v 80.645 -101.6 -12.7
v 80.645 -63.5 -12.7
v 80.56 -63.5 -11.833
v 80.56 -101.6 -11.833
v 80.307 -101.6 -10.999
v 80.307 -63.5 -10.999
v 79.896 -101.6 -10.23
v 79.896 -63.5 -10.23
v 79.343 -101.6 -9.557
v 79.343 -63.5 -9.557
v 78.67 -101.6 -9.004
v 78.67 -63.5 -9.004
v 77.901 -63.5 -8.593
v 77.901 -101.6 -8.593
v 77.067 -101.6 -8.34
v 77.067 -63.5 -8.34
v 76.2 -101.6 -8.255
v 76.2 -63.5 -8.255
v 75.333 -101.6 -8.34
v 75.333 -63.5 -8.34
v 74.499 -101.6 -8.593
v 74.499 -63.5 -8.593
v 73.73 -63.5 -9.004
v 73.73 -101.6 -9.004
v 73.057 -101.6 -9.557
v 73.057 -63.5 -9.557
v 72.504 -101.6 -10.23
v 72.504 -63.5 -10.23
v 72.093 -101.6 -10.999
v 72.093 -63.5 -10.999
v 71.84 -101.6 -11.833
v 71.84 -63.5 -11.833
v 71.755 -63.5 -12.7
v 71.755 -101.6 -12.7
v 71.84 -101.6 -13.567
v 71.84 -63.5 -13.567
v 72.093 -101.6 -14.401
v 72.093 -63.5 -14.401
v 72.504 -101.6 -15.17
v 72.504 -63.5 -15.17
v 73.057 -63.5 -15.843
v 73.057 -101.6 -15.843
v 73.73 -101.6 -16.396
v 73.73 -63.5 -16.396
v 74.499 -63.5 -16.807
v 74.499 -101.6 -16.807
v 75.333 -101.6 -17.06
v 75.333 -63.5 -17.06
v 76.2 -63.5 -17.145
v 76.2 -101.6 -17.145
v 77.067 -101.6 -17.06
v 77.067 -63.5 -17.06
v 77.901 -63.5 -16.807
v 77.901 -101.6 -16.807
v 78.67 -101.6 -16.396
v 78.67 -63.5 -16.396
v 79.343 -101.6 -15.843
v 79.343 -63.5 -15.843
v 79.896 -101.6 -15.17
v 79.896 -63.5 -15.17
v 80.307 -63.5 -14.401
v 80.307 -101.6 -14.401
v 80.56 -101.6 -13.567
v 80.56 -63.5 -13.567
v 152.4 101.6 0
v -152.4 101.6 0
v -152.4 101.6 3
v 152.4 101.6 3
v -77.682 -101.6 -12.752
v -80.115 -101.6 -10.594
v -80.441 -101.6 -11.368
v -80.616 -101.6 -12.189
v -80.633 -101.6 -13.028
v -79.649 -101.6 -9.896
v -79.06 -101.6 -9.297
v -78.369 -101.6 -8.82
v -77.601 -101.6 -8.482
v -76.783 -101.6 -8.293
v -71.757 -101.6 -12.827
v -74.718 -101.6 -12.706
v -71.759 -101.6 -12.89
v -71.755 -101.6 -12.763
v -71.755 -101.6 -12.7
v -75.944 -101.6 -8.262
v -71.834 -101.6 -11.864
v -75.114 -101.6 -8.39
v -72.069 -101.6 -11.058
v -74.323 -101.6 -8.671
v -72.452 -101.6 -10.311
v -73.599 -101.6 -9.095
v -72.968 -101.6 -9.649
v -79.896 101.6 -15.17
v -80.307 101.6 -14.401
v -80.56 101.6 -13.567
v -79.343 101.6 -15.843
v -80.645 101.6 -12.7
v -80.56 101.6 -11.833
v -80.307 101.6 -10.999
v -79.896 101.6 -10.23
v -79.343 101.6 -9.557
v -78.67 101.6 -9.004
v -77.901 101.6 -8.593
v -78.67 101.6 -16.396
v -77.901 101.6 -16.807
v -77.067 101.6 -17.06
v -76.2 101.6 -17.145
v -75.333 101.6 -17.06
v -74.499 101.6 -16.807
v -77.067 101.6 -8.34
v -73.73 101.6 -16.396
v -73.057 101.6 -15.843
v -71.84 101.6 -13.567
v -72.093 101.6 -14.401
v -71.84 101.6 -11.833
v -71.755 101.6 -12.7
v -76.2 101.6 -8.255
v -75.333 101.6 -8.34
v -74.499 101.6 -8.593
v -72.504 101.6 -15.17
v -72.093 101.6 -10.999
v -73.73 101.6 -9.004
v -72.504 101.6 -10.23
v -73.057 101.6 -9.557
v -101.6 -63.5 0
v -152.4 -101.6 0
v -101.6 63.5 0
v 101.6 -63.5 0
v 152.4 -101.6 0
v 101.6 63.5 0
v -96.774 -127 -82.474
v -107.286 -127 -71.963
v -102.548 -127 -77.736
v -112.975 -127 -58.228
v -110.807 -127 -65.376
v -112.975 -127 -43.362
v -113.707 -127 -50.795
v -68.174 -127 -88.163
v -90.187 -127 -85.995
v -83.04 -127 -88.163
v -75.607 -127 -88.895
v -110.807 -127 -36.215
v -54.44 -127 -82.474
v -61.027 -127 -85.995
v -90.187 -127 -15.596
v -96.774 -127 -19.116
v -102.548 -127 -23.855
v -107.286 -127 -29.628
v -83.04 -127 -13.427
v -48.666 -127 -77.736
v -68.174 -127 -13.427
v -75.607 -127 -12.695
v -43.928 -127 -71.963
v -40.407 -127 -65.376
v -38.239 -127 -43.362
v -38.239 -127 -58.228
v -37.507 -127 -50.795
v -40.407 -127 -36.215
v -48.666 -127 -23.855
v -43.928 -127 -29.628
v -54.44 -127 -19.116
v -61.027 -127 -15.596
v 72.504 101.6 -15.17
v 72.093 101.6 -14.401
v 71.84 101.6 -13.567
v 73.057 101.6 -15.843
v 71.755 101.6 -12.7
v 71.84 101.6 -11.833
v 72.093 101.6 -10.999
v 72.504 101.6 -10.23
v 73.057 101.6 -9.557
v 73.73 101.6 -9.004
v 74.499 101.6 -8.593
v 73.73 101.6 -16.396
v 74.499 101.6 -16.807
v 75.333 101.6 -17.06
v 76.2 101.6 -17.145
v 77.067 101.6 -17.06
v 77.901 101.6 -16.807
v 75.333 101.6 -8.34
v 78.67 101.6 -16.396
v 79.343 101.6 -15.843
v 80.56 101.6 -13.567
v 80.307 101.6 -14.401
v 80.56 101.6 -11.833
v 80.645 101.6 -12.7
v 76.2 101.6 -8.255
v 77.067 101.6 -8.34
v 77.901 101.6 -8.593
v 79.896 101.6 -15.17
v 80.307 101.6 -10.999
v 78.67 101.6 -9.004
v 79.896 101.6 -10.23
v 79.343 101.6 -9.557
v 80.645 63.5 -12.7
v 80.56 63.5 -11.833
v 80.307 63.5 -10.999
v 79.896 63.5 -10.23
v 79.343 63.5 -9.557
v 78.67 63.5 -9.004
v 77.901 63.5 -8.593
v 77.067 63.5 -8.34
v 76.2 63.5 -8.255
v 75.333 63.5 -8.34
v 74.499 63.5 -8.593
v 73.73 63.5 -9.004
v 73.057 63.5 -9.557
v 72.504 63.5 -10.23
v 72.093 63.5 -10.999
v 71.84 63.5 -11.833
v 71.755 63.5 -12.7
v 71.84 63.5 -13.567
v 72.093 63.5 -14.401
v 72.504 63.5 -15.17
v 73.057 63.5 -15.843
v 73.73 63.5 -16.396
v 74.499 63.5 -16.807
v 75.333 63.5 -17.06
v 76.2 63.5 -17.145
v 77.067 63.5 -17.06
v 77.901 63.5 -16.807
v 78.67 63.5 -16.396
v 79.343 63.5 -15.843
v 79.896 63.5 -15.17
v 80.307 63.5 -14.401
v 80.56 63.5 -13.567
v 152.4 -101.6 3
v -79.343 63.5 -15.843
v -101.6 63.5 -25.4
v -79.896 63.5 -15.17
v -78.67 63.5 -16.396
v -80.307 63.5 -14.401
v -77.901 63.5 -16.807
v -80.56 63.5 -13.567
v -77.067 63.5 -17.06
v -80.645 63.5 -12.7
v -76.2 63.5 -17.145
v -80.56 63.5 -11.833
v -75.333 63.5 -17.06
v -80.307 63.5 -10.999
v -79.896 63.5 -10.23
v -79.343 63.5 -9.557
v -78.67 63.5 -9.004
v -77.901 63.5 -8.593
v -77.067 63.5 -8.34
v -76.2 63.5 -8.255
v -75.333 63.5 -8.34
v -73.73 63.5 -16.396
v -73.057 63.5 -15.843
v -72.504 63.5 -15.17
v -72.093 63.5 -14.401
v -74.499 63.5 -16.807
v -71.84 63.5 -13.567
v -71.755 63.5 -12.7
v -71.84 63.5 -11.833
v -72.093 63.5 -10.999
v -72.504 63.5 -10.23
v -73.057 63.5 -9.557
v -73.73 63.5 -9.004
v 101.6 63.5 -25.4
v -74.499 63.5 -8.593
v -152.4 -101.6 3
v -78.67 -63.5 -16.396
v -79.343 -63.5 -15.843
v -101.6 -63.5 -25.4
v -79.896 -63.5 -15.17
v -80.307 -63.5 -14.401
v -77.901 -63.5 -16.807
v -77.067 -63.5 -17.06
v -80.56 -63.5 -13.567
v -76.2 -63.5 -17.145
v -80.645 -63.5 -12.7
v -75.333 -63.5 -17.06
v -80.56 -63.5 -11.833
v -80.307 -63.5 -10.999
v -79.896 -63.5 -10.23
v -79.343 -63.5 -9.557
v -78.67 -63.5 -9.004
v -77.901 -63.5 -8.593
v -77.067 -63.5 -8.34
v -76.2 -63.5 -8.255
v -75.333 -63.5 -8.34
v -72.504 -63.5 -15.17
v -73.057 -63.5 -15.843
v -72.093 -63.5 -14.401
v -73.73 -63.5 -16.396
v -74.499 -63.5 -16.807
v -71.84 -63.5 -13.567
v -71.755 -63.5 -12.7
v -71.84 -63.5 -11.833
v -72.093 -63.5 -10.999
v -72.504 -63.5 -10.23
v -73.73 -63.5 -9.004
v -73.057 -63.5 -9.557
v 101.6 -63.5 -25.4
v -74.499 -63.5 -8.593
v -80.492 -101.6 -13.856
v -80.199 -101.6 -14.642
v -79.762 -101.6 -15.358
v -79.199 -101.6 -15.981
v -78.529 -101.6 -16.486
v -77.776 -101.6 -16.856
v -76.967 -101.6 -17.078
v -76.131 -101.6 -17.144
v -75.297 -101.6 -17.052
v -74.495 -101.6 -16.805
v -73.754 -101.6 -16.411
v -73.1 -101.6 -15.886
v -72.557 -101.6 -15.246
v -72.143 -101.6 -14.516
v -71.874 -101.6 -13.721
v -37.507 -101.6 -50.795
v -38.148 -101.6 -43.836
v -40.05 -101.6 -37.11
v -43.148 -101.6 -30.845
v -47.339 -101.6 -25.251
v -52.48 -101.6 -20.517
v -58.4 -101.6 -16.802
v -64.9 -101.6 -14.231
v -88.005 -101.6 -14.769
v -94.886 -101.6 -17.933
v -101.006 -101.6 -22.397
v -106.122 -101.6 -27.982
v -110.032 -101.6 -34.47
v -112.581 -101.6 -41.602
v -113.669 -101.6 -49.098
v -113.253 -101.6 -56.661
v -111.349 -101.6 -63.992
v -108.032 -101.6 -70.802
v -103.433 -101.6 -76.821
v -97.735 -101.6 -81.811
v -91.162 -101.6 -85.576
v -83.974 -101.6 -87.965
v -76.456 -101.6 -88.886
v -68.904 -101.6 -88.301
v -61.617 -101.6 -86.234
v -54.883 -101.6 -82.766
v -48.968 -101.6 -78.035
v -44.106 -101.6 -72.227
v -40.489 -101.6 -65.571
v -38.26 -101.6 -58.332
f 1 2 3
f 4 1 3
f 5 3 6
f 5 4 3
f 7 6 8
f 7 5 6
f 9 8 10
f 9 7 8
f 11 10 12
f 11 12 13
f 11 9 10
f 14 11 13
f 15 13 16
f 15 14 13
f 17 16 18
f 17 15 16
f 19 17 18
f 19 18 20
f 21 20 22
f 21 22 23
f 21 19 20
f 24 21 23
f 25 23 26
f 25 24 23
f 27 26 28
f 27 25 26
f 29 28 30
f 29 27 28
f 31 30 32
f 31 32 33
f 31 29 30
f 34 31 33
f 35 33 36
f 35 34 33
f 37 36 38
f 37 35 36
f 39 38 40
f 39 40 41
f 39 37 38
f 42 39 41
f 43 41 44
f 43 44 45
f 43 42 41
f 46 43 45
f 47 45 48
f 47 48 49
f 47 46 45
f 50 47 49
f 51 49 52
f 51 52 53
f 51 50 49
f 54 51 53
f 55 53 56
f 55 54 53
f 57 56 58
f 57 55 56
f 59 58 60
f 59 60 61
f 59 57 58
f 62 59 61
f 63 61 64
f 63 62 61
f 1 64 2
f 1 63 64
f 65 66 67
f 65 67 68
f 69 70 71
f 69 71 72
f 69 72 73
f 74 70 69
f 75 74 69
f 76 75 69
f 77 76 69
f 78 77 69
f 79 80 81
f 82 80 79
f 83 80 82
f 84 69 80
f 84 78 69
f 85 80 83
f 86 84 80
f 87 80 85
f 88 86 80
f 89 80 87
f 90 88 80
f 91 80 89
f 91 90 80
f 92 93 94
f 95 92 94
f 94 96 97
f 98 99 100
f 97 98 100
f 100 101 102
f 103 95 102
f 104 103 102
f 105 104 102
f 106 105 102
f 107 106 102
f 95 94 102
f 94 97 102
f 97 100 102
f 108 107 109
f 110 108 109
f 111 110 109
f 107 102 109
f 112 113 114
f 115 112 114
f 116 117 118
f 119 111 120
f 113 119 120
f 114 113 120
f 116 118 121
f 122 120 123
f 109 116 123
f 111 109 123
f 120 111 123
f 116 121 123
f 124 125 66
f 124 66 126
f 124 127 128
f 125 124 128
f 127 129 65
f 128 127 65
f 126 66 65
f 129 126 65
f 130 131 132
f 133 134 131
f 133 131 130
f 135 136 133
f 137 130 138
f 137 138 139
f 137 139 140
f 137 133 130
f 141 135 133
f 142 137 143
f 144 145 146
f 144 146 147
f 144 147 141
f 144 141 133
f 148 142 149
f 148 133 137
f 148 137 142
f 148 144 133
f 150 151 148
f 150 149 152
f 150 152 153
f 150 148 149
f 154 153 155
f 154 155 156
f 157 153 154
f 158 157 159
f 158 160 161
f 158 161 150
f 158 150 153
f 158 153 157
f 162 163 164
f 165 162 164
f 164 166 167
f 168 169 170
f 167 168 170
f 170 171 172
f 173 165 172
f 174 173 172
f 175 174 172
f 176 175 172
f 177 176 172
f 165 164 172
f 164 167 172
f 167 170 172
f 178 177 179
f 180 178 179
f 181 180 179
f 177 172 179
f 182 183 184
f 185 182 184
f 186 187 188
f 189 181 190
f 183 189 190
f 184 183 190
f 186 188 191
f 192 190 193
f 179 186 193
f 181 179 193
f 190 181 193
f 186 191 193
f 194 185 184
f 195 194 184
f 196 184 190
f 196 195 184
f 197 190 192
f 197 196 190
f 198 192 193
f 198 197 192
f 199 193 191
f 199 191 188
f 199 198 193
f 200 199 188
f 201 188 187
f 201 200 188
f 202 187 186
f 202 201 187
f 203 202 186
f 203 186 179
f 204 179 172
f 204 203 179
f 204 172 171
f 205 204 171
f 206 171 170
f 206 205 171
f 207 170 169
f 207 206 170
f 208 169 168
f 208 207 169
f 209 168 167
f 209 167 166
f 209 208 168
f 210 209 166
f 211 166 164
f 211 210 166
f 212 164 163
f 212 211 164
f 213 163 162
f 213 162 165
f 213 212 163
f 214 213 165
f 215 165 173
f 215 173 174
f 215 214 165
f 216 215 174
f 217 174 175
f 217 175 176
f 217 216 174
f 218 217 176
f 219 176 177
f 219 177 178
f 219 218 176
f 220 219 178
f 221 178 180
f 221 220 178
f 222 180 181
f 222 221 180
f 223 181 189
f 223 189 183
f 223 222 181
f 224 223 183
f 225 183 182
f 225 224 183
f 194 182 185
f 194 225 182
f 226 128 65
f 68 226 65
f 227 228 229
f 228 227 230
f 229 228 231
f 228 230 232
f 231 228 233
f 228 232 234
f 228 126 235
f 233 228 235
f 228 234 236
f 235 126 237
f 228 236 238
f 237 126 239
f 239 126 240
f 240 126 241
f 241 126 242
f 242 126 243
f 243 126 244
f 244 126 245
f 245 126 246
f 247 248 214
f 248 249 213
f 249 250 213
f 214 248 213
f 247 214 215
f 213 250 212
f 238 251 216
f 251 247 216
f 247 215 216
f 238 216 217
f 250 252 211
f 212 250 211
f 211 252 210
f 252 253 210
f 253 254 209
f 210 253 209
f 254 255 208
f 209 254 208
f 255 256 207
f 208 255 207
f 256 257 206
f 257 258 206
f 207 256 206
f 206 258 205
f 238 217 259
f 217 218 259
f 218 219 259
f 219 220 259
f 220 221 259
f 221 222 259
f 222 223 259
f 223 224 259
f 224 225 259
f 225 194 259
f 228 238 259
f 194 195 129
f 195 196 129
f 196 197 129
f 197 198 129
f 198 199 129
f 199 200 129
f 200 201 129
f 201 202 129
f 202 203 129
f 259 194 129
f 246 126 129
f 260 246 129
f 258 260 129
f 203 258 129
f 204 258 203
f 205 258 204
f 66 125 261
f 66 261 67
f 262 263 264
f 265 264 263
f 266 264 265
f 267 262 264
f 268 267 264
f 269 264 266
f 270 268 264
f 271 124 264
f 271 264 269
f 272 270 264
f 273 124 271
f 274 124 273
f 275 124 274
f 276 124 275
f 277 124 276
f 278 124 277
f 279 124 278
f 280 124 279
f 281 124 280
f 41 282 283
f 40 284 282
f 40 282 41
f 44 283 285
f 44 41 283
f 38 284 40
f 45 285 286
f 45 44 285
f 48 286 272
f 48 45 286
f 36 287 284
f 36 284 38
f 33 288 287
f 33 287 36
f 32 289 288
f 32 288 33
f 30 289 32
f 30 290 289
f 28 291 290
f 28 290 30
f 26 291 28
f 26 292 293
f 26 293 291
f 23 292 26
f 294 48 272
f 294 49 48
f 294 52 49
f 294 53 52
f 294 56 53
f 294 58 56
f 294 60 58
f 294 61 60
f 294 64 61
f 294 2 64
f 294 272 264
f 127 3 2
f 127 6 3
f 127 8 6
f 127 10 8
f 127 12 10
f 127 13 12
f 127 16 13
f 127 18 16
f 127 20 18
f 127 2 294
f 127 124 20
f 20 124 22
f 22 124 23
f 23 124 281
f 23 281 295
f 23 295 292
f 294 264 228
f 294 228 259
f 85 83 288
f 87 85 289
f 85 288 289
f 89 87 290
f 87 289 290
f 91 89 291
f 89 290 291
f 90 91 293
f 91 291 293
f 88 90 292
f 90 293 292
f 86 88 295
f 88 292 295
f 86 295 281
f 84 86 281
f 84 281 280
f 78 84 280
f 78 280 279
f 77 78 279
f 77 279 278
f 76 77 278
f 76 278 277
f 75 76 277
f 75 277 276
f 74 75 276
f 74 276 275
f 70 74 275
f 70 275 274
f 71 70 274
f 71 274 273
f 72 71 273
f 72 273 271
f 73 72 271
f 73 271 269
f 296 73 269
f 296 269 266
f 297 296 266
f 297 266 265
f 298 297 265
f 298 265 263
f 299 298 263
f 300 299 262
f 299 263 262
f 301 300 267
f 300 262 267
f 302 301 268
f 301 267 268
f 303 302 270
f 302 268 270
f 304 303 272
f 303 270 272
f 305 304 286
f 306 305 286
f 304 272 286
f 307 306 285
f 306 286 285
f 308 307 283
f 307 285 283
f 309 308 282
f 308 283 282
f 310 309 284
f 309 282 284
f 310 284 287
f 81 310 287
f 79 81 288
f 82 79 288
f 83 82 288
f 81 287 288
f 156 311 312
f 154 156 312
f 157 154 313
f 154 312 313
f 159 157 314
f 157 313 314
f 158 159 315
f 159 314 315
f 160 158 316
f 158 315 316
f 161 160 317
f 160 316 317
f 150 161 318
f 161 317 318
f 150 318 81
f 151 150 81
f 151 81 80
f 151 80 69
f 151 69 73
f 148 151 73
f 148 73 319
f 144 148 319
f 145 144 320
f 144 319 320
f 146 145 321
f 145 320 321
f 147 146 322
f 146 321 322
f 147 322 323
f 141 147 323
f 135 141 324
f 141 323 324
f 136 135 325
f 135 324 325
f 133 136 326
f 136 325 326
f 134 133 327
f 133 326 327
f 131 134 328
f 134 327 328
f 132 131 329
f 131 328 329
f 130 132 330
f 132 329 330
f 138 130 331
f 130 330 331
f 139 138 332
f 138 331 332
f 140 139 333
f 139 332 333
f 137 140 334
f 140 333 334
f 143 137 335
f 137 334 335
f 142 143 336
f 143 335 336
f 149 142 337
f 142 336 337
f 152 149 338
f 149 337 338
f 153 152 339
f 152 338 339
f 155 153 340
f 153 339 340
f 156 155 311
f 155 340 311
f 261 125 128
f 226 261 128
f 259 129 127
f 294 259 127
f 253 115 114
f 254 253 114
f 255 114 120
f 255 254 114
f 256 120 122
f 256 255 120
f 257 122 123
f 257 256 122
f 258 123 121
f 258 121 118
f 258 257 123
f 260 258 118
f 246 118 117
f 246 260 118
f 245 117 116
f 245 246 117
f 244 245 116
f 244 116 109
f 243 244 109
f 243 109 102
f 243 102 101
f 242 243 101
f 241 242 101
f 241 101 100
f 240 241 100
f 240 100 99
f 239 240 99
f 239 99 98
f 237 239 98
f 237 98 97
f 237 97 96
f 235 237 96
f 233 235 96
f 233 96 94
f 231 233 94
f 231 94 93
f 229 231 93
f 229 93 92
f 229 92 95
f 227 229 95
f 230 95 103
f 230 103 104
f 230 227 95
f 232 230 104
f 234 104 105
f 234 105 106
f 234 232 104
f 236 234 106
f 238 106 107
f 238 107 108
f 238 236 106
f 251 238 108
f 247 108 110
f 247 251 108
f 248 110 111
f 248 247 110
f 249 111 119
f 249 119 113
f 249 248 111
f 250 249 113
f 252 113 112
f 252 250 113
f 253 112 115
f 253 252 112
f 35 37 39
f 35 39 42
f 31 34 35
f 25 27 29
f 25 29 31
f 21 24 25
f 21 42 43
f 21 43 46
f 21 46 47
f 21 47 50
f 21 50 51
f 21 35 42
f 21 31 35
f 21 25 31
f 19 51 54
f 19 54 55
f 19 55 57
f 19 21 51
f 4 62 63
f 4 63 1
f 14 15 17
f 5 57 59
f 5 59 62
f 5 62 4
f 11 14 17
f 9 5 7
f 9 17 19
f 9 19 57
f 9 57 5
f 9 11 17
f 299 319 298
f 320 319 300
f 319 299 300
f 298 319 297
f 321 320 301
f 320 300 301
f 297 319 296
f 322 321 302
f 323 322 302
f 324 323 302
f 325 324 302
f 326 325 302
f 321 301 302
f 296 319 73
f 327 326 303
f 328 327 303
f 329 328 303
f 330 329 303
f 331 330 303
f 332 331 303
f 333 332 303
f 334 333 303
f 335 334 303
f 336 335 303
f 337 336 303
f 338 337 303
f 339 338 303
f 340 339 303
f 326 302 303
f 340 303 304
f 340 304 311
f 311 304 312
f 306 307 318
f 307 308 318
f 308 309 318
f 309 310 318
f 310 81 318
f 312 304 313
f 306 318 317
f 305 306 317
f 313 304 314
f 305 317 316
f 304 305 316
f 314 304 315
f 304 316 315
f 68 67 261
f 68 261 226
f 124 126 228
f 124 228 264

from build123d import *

# Parameters (mm, degrees)
F0_W     = 304.8
F0_H     = 203.2
F1_DEPTH = 3
F2_W     = 203.2
F2_H     = 127
F3_DEPTH = 25.4
F4_R     = 4.445
F5_DEPTH = 101.6
F6_R     = 38.1
F7_DEPTH = 25.4


with BuildPart() as f1:
    # F0 (on Top) → F1 (new body)
    with BuildSketch(Plane.XY):
        Rectangle(F0_W, F0_H)
    extrude(amount=F1_DEPTH)

    # F2 (on face) → F3 (join)
    with BuildSketch(Plane(origin=(0, 0, 0), x_dir=(1, 0, 0), z_dir=(0, 0, -1))):
        Rectangle(F2_W, F2_H)
    extrude(amount=F3_DEPTH)

    # F4 (on Front) → F5 (join, symmetric)
    with BuildSketch(Plane.XZ):
        with Locations((-76.2, -12.7)):
            Circle(F4_R)
        with Locations((76.2, -12.7)):
            Circle(F4_R)
    extrude(amount=F5_DEPTH, both=True)

    # F6 (on face) → F7 (join)
    with BuildSketch(Plane.XZ.offset(101.6)):
        with Locations((-75.607116, -50.795387)):
            Circle(F6_R)
    extrude(amount=F7_DEPTH)


solid = f1.part
